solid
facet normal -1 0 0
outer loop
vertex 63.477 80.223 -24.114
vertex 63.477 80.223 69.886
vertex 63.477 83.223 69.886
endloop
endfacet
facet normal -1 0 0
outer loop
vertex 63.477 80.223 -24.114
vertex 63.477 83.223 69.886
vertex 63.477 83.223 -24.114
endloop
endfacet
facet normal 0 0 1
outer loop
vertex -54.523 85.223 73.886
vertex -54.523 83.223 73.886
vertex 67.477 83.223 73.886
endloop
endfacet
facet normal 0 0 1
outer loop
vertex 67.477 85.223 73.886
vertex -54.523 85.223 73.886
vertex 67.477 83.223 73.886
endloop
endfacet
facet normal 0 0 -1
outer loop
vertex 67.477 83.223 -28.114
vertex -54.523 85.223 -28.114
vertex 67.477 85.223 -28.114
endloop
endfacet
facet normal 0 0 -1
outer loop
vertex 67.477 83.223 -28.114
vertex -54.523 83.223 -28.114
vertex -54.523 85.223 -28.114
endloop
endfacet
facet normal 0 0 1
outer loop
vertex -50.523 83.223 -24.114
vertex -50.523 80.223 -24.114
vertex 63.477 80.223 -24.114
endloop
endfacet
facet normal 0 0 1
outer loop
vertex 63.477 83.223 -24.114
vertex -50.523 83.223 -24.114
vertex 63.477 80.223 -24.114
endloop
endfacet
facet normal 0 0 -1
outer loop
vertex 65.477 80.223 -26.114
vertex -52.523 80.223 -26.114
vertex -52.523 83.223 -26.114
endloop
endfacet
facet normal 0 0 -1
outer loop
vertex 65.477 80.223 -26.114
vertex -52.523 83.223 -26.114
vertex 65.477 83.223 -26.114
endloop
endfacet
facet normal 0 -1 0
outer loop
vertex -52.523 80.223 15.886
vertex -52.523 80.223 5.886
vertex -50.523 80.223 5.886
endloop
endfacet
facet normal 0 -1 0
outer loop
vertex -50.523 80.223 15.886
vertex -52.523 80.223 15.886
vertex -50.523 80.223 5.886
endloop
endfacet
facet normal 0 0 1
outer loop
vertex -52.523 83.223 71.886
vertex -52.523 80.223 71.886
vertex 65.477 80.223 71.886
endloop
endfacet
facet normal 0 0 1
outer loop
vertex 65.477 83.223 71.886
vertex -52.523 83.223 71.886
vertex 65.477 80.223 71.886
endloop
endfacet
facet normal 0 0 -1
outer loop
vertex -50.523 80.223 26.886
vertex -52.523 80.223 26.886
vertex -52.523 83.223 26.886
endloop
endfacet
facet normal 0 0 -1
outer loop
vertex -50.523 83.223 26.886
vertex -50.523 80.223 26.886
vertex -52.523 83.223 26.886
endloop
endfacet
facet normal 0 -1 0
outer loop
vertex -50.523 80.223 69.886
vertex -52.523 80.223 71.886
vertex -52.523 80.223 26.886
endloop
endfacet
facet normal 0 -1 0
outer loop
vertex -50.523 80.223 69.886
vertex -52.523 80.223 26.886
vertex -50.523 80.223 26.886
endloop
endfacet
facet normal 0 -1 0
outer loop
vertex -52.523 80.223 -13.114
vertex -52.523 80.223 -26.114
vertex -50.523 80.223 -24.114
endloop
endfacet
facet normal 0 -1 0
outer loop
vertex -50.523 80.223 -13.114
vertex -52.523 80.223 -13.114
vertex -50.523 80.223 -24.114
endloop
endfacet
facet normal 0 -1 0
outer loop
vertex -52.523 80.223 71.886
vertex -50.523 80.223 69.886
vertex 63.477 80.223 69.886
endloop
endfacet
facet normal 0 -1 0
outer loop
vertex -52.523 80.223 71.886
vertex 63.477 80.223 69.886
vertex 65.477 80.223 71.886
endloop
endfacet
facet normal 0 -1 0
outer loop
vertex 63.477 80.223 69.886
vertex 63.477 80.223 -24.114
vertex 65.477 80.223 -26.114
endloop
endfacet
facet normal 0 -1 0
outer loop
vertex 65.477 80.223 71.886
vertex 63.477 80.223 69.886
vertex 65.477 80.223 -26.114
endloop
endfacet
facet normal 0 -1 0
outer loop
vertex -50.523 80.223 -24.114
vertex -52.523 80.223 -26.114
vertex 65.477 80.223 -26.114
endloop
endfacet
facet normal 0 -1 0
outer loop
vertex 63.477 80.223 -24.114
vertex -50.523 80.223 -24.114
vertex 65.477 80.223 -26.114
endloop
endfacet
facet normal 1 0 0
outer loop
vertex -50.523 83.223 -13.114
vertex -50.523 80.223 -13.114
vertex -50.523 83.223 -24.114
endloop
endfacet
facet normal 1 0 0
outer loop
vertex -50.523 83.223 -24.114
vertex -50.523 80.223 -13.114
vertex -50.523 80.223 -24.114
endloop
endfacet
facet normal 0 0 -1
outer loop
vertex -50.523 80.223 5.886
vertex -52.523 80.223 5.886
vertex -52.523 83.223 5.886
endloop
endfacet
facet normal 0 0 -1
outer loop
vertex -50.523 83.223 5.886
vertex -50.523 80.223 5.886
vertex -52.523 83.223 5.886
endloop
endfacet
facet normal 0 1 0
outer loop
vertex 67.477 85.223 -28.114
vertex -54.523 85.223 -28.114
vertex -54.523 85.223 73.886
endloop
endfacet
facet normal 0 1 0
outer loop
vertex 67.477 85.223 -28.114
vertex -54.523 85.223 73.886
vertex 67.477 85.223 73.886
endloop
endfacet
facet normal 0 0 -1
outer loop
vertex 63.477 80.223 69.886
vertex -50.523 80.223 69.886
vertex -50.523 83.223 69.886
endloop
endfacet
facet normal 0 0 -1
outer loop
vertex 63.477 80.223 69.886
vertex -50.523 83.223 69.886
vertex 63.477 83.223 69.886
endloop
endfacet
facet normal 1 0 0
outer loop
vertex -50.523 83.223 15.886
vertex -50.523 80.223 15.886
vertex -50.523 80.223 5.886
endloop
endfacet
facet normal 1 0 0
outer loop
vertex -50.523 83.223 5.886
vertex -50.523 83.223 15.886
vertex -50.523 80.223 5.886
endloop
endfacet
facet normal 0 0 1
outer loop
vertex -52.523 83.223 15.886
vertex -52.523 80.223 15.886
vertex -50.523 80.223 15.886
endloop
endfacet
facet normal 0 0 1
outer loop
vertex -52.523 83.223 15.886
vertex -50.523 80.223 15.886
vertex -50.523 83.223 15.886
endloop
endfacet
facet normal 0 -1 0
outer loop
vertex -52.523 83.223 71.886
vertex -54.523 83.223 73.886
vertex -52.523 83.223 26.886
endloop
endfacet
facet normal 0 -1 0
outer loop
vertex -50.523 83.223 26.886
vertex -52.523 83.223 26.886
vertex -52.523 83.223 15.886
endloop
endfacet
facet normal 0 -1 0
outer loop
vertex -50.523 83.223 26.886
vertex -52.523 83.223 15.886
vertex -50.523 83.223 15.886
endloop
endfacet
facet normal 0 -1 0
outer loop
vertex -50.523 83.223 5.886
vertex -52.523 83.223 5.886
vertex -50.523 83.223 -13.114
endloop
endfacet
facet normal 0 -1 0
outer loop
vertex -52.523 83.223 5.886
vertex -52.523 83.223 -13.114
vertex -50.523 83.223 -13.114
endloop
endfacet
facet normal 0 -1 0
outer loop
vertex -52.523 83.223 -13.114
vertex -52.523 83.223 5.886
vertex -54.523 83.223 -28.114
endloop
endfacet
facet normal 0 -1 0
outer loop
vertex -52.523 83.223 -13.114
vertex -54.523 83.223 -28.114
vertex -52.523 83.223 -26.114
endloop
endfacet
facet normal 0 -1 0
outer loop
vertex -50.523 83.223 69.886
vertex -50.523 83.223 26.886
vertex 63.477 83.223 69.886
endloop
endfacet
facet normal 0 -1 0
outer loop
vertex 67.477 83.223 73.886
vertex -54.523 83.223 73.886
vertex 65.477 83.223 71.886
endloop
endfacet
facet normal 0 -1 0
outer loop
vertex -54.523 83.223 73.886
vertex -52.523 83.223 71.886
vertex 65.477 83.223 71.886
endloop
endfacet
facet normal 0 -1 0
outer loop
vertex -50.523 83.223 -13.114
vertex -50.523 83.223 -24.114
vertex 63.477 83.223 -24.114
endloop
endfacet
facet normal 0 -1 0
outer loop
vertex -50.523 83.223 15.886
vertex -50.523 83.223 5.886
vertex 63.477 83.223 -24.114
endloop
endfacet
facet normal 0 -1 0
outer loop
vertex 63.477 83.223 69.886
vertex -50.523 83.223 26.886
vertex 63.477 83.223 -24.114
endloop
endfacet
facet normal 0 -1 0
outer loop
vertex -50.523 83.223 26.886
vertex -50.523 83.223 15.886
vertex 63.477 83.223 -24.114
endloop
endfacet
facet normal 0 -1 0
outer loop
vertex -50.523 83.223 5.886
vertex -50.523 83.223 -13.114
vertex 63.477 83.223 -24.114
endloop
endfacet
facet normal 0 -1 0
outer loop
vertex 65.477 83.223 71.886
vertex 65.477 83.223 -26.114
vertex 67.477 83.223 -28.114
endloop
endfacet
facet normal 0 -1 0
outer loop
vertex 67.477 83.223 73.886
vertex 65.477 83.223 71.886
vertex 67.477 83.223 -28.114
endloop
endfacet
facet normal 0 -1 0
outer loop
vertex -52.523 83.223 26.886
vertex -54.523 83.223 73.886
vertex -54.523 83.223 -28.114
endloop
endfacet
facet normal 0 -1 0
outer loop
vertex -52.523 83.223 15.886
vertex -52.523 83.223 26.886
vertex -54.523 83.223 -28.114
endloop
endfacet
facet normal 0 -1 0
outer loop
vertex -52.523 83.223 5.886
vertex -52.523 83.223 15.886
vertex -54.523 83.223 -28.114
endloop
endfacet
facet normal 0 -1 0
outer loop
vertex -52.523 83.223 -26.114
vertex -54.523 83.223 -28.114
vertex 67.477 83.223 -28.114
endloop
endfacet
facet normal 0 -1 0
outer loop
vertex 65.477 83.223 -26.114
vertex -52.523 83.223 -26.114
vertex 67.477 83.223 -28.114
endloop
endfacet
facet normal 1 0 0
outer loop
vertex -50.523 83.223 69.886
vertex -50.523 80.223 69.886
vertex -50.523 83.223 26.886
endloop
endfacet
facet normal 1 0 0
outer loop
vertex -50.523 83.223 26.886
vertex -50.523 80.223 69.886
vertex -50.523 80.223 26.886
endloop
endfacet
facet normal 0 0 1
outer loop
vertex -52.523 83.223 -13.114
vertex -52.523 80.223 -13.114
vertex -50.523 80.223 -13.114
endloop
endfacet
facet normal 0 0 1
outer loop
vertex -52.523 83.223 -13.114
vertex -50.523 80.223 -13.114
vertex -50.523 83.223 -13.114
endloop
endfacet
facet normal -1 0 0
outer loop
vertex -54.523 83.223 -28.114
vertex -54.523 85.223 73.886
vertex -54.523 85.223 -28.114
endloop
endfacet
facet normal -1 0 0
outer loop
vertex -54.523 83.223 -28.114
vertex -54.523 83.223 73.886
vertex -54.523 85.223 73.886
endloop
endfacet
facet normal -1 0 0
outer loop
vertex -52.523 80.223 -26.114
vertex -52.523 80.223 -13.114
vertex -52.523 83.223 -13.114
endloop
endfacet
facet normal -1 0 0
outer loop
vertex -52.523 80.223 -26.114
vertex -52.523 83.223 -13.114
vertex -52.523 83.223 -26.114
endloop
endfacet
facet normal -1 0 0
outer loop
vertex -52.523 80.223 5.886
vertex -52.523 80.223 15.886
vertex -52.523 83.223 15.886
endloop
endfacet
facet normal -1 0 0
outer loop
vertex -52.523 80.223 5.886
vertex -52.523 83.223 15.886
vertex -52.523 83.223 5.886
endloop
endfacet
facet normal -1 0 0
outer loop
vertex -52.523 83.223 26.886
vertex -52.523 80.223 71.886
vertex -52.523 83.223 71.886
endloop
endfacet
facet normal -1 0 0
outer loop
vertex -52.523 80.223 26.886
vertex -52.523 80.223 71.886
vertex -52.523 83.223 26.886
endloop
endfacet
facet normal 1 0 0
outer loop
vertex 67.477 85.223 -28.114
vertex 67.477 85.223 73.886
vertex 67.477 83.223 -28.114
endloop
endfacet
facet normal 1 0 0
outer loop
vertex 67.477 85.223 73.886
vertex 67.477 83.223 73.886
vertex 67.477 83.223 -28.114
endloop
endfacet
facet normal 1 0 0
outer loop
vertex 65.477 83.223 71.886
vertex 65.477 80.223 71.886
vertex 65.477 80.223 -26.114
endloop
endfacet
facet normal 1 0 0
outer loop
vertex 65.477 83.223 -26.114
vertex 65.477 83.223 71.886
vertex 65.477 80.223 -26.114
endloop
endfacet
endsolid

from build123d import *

# Parameters (mm, degrees)
STOCK_BOX_1_START         = 83.223281248
STOCK_BOX_1_OUTLINE_W     = 122
STOCK_BOX_1_OUTLINE_H     = 102
STOCK_BOX_1_DEPTH         = 5
STOCK_BOX_1_START_2       = 80.223281248
STOCK_BOX_1_2_OUTLINE_W   = 118
STOCK_BOX_1_2_OUTLINE_H   = 98
STOCK_BOX_1_2_OUTLINE_W_2 = 114
STOCK_BOX_1_2_OUTLINE_H_2 = 94
STOCK_BOX_1_2_DEPTH       = 3
CUT_EXTRUDE2_REACH        = 168.26
SKETCH2_W                 = 19
SKETCH2_H                 = 3
SKETCH2_W_2               = 11
SKETCH3_W                 = 122
SKETCH3_H                 = 102
BOSS_EXTRUDE1_DEPTH       = 3
SKETCH4_W                 = 122
SKETCH4_H                 = 102
CUT_EXTRUDE3_DEPTH        = 3


# Read off the part's stored shape, not the designer's step: Stock-Box-1
with BuildPart() as part:
    # Stock-Box-1 outline → Stock-Box-1 (new body)
    with BuildSketch(Plane(origin=(0, 0, 0), x_dir=(1, 0, 0), z_dir=(0, 1, 0)).offset(STOCK_BOX_1_START)):
        with Locations((6.476673428, -22.886409736)):
            Rectangle(STOCK_BOX_1_OUTLINE_W, STOCK_BOX_1_OUTLINE_H)
    extrude(amount=STOCK_BOX_1_DEPTH)

    # Stock-Box-1 2 outline → Stock-Box-1 2 (add)
    with BuildSketch(Plane(origin=(0, 0, 0), x_dir=(1, 0, 0), z_dir=(0, 1, 0)).offset(STOCK_BOX_1_START_2)):
        with Locations((6.476673428, -22.886409736)):
            Rectangle(STOCK_BOX_1_2_OUTLINE_W, STOCK_BOX_1_2_OUTLINE_H)
        with Locations((6.476673428, -22.886409736)):
            Rectangle(STOCK_BOX_1_2_OUTLINE_W_2, STOCK_BOX_1_2_OUTLINE_H_2, mode=Mode.SUBTRACT)
    extrude(amount=STOCK_BOX_1_2_DEPTH)

    # Sketch2 → Cut-Extrude2 (cut, up to next)
    with BuildSketch(Plane.ZY.offset(52.523326572), mode=Mode.PRIVATE) as cut_extrude2_sk1:
        with Locations((-3.613590264, 81.723281248)):
            Rectangle(SKETCH2_W, SKETCH2_H)
    cut_extrude2_tool1 = extrude(cut_extrude2_sk1.sketch, amount=-CUT_EXTRUDE2_REACH, mode=Mode.PRIVATE) & part.part
    # Sketch2 → Cut-Extrude2 (cut, up to next)
    with BuildSketch(Plane.ZY.offset(52.523326572), mode=Mode.PRIVATE) as cut_extrude2_sk2:
        with Locations((21.386409736, 81.723281248)):
            Rectangle(SKETCH2_W_2, SKETCH2_H)
    cut_extrude2_tool2 = extrude(cut_extrude2_sk2.sketch, amount=-CUT_EXTRUDE2_REACH, mode=Mode.PRIVATE) & part.part
    add(cut_extrude2_tool1.solids().sort_by_distance((-52.523327, 81.723281, -3.61359))[0], mode=Mode.SUBTRACT)
    add(cut_extrude2_tool2.solids().sort_by_distance((-52.523327, 81.723281, 21.38641))[0], mode=Mode.SUBTRACT)

    # Sketch3 → Boss-Extrude1 (add)
    with BuildSketch(Plane(origin=(0, 88.223281248, 0), x_dir=(1, 0, 0), z_dir=(0, 1, 0))):
        with Locations((6.476673428, -22.886409736)):
            Rectangle(SKETCH3_W, SKETCH3_H)
    extrude(amount=-BOSS_EXTRUDE1_DEPTH)

    # Sketch4 → Cut-Extrude3 (cut)
    with BuildSketch(Plane(origin=(0, 88.223281248, 0), x_dir=(1, 0, 0), z_dir=(0, 1, 0))):
        with Locations((6.476673428, -22.886409736)):
            Rectangle(SKETCH4_W, SKETCH4_H)
    extrude(amount=-CUT_EXTRUDE3_DEPTH, mode=Mode.SUBTRACT)


solid = part.part
